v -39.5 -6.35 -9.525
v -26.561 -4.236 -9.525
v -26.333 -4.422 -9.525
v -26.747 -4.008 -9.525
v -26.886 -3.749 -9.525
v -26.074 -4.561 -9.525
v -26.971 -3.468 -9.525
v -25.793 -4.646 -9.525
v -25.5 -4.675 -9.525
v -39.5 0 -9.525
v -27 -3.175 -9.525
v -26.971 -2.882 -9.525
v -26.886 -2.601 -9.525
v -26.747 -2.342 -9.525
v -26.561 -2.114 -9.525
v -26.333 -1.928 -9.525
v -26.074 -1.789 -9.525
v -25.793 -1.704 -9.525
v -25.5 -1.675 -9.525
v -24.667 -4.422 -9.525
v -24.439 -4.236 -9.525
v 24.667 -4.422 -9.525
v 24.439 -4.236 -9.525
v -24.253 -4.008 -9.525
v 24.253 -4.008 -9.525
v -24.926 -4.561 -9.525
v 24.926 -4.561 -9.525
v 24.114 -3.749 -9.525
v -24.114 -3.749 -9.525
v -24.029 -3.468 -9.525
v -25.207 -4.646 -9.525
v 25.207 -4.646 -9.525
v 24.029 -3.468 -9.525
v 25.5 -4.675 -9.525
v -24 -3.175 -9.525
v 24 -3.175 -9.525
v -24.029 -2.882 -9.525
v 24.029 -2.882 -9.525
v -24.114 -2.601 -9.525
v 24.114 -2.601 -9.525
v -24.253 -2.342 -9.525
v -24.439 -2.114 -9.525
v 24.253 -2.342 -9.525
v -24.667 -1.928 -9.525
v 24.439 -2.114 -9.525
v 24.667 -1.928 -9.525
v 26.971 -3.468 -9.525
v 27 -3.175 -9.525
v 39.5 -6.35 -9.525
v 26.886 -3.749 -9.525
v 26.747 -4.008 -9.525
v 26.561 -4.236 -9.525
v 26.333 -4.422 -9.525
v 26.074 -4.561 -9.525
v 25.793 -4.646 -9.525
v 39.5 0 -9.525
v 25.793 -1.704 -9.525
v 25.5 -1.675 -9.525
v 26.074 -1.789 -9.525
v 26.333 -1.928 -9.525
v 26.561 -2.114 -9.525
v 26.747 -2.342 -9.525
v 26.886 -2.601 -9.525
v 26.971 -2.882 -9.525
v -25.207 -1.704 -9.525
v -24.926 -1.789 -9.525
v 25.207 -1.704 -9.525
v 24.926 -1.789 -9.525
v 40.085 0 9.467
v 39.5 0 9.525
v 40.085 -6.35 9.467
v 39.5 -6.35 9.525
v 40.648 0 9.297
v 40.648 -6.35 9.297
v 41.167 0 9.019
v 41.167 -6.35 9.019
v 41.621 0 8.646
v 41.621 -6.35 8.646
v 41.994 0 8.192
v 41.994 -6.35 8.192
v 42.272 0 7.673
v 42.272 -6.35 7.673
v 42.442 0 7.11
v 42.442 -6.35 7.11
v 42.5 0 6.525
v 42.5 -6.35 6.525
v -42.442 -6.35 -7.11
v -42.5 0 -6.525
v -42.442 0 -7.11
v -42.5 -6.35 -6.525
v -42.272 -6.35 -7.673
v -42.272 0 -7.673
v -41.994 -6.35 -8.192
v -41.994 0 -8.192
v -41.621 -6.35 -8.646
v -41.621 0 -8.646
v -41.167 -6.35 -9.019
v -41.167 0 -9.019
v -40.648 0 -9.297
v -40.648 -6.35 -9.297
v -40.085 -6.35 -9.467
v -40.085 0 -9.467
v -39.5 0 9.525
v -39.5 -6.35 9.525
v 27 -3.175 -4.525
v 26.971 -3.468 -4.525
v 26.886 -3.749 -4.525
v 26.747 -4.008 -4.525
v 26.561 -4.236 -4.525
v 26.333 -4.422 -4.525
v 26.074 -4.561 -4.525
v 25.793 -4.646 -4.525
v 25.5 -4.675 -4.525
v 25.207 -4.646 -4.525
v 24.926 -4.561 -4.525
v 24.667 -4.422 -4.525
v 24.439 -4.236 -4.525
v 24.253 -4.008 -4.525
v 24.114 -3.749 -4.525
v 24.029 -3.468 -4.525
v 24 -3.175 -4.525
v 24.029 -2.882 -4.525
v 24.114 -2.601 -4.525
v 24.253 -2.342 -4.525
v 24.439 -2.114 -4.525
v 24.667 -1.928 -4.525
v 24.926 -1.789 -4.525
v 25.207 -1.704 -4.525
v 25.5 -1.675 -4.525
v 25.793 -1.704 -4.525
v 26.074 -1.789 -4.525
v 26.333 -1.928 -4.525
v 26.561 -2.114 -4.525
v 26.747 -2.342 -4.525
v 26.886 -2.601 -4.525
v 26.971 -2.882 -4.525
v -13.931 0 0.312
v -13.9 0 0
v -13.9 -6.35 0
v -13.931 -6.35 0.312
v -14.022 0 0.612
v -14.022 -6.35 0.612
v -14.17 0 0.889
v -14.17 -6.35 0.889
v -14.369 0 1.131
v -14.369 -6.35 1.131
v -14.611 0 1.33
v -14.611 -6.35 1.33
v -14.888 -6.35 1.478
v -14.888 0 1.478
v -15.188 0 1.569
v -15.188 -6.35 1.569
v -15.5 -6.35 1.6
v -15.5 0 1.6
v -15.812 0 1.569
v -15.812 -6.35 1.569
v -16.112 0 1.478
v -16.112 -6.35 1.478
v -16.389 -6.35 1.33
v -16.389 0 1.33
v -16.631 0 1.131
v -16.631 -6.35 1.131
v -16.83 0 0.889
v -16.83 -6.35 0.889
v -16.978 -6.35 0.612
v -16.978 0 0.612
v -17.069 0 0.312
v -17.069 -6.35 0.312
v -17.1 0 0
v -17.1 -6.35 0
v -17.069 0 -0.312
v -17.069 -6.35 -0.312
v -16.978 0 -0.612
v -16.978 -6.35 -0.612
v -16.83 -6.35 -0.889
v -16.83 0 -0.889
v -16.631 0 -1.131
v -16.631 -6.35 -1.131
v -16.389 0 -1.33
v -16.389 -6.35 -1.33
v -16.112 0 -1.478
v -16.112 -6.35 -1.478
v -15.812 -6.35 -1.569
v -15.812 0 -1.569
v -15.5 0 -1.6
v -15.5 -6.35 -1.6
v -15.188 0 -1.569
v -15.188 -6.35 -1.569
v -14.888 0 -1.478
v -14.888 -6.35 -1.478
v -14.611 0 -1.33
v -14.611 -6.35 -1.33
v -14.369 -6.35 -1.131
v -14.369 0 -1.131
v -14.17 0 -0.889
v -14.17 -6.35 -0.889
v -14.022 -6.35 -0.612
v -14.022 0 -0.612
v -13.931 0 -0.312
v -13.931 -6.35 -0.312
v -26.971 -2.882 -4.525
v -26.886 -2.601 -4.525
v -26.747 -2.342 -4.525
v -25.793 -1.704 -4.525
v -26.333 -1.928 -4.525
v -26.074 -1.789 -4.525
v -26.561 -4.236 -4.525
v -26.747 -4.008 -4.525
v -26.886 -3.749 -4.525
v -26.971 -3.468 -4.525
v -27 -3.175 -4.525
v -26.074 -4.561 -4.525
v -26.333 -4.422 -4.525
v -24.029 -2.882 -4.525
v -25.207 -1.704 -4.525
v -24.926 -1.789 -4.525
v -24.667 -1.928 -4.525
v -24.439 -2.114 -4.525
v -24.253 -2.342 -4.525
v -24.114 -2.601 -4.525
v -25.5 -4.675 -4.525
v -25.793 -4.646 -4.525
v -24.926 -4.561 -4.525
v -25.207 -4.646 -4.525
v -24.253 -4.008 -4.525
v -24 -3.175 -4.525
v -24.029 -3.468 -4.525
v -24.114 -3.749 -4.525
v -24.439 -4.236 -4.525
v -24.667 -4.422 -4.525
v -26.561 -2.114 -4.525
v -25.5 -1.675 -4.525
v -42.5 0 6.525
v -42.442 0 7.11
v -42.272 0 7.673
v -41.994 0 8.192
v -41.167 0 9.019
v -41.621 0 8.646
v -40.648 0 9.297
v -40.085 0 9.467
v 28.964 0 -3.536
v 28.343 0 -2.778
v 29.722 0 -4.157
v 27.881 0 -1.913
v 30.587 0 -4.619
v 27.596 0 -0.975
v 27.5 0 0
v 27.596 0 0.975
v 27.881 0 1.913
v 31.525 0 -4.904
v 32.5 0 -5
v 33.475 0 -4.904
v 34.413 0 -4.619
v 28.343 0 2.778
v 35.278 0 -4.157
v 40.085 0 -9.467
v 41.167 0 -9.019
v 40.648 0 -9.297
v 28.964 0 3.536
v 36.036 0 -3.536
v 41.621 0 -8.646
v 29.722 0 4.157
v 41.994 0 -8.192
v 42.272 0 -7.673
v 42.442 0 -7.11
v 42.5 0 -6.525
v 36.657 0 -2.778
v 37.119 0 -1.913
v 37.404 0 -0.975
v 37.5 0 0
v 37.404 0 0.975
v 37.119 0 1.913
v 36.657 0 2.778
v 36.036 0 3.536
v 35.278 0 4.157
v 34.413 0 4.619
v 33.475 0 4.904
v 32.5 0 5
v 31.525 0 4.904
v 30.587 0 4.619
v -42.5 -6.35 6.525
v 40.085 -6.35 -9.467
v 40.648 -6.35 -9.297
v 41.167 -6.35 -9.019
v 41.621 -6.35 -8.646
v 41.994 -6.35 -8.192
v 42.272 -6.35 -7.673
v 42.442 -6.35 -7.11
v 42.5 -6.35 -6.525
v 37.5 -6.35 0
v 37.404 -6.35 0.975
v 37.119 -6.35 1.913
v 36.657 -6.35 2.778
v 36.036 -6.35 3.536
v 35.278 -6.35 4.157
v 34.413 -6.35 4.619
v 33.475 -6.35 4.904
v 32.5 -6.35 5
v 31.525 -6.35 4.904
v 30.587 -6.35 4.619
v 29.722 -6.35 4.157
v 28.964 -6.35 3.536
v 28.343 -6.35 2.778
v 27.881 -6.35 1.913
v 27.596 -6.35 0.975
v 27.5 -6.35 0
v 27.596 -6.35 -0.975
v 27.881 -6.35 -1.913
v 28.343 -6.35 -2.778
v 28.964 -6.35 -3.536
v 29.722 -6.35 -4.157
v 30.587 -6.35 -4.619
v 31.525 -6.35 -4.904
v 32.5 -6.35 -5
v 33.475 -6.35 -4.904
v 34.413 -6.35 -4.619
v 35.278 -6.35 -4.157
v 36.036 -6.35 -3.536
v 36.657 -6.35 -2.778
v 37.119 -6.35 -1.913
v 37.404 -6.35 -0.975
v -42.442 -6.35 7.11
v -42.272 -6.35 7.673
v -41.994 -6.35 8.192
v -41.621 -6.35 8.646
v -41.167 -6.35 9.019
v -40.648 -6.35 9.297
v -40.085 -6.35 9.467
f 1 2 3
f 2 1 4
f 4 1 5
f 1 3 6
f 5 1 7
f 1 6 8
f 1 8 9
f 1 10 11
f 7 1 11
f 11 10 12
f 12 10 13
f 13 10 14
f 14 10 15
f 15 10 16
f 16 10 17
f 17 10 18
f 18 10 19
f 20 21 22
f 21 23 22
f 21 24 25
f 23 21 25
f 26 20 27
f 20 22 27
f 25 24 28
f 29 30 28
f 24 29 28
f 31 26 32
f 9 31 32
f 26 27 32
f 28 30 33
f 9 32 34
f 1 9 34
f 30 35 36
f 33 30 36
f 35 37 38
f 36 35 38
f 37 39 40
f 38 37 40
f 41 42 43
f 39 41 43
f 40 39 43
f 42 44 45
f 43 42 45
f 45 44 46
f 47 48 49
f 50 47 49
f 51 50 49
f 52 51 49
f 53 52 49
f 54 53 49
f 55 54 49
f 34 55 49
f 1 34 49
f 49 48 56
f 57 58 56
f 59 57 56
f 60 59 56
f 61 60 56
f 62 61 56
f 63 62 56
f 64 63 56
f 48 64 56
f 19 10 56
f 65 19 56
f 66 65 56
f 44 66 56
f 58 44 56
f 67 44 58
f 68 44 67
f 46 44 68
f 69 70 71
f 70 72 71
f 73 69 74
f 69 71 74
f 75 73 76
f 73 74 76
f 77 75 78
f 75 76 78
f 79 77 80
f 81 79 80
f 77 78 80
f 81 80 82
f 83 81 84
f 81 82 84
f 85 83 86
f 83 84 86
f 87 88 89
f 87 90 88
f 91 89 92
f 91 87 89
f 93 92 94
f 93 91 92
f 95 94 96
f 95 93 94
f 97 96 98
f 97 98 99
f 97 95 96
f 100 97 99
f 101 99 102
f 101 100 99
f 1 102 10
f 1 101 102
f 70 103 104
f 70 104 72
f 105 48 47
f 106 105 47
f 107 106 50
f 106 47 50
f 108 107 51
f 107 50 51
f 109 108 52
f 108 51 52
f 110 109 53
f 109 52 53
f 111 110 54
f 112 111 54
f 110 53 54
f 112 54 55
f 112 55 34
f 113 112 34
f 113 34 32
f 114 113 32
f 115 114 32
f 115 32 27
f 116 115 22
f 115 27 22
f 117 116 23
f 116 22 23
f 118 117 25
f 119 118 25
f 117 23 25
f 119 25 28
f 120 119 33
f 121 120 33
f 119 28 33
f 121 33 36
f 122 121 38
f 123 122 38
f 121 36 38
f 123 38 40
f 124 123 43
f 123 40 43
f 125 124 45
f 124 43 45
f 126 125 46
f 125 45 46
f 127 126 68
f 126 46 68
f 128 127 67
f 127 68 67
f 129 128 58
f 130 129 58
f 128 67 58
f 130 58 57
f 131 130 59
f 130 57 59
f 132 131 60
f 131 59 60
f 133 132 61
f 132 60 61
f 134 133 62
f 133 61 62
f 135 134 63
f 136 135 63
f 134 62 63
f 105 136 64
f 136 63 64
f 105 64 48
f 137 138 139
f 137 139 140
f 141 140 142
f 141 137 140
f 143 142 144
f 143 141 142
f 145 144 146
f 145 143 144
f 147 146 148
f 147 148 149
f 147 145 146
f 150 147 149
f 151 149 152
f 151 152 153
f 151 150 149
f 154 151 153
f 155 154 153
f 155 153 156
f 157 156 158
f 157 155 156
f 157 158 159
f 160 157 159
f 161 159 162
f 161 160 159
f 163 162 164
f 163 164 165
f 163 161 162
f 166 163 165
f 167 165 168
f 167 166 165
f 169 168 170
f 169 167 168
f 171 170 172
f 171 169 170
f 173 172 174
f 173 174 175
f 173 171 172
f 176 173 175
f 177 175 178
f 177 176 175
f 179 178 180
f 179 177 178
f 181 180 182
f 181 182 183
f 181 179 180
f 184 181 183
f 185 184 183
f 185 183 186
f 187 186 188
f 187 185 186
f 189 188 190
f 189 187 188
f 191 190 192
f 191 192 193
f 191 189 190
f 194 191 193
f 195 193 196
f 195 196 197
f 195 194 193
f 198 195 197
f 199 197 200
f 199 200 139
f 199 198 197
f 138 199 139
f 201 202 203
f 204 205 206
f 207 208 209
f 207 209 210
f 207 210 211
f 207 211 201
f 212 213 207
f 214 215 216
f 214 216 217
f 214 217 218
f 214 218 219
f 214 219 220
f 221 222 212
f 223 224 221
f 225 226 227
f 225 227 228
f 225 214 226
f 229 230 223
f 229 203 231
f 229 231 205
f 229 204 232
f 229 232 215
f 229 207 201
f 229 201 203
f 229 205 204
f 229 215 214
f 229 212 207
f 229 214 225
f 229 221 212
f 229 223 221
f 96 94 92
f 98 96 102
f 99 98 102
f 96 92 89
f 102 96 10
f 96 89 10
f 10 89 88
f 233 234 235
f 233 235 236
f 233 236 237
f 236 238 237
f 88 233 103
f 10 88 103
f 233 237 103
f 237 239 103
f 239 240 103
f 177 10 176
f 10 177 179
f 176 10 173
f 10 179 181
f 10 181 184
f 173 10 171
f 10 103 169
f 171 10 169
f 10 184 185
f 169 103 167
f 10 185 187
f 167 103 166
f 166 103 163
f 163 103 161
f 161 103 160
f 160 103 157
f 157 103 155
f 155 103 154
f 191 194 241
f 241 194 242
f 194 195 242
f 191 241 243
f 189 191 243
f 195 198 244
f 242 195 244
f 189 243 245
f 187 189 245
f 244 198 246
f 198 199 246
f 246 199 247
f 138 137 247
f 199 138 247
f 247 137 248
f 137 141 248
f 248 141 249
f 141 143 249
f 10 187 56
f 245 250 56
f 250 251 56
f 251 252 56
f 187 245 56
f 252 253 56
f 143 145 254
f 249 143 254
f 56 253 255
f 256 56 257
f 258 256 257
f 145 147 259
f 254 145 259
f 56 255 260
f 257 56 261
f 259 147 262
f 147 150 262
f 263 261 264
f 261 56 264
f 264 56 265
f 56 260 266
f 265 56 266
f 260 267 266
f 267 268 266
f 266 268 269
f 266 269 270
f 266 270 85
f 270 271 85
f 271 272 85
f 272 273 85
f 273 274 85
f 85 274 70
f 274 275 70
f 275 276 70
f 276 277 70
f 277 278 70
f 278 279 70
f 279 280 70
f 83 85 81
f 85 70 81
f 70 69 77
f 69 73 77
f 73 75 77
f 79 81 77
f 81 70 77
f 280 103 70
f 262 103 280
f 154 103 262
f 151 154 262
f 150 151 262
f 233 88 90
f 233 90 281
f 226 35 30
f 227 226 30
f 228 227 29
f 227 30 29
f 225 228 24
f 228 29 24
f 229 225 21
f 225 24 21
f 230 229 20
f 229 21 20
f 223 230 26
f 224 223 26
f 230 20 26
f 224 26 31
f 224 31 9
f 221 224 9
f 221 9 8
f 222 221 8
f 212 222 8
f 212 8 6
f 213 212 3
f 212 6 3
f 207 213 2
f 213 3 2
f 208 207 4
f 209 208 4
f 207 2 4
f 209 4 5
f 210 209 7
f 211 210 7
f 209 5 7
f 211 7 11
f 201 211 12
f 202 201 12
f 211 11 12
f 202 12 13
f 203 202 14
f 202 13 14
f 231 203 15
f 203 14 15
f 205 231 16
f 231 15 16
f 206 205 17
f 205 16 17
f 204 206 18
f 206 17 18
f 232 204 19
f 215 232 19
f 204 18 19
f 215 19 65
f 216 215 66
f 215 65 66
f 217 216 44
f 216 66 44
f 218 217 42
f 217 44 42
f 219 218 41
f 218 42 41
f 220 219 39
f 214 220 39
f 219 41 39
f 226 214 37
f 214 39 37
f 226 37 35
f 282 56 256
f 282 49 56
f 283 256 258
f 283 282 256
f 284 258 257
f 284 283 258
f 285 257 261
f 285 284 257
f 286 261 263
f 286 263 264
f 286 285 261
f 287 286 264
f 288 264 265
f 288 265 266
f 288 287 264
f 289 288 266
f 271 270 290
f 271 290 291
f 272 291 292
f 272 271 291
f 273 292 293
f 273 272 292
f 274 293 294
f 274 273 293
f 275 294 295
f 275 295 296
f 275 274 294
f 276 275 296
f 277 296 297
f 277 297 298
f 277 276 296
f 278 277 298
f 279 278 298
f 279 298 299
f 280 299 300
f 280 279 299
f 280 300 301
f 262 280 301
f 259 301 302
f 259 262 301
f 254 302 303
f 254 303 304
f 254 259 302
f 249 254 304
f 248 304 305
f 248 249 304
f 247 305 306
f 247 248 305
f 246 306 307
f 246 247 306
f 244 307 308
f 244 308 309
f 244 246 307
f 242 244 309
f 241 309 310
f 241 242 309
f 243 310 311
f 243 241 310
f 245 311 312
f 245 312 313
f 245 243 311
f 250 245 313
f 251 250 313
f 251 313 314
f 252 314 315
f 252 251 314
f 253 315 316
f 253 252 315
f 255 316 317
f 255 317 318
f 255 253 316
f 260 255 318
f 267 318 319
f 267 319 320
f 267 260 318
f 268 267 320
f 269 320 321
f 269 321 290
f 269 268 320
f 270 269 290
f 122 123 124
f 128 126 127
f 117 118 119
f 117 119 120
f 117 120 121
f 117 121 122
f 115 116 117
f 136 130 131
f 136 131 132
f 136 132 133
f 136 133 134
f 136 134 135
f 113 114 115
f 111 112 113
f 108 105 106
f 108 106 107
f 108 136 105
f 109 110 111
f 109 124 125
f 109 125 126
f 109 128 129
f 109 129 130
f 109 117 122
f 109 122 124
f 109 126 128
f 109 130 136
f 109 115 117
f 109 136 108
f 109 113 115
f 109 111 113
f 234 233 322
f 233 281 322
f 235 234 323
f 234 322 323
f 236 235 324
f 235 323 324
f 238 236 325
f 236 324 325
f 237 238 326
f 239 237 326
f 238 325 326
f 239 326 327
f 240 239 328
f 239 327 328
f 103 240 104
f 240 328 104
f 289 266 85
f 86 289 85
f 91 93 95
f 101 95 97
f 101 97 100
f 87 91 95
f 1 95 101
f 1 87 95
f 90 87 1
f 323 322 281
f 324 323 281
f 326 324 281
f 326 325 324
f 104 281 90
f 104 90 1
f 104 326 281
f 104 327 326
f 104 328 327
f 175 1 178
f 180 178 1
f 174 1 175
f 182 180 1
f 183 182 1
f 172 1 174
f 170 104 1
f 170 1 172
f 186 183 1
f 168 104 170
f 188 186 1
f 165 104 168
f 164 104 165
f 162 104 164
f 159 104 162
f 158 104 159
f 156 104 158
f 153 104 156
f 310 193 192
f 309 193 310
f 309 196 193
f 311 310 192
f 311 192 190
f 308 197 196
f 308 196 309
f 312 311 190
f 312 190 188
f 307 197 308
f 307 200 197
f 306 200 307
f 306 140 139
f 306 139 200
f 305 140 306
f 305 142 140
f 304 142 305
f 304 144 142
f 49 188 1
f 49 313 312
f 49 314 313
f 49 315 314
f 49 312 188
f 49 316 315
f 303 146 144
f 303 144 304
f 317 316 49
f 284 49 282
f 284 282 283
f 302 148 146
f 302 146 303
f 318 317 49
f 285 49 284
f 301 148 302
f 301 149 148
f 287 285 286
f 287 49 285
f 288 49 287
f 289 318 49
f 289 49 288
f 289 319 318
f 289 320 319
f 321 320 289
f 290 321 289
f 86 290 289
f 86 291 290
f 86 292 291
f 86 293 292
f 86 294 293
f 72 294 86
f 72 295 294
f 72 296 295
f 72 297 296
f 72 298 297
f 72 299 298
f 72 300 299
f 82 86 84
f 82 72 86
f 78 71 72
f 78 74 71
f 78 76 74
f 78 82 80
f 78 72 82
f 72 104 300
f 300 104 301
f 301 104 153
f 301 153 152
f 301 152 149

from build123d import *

# Parameters (mm, degrees)
F0_W     = 85
F0_H     = 19.05
F0_R     = 1.6
F0_R_2   = 5
F1_DEPTH = 6.35
F2_R     = 1.5
F3_DEPTH = 5
F4_R     = 3


with BuildPart() as f1:
    # F0 (on Front) → F1 (new body)
    with BuildSketch(Plane.XZ):
        Rectangle(F0_W, F0_H)
        with Locations((-15.5, 0)):
            Circle(F0_R, mode=Mode.SUBTRACT)
        with Locations((32.5, 0)):
            Circle(F0_R_2, mode=Mode.SUBTRACT)
    extrude(amount=F1_DEPTH)

    # F2 (on face) → F3 (cut)
    with BuildSketch(Plane(origin=(0, 0, -9.525), x_dir=(1, 0, 0), z_dir=(0, 0, -1))):
        with Locations((-25.5, 3.175)):
            Circle(F2_R)
        with Locations((25.5, 3.175)):
            Circle(F2_R)
    extrude(amount=-F3_DEPTH, mode=Mode.SUBTRACT)

    # F4
    f4_edges = [f1.edges().sort_by_distance(p)[0] for p in [
        (42.5, -3.175, 9.525),
        (42.5, -3.175, -9.525),
        (-42.5, -3.175, -9.525),
        (-42.5, -3.175, 9.525),
    ]]
    fillet(f4_edges, radius=F4_R)


solid = f1.part
